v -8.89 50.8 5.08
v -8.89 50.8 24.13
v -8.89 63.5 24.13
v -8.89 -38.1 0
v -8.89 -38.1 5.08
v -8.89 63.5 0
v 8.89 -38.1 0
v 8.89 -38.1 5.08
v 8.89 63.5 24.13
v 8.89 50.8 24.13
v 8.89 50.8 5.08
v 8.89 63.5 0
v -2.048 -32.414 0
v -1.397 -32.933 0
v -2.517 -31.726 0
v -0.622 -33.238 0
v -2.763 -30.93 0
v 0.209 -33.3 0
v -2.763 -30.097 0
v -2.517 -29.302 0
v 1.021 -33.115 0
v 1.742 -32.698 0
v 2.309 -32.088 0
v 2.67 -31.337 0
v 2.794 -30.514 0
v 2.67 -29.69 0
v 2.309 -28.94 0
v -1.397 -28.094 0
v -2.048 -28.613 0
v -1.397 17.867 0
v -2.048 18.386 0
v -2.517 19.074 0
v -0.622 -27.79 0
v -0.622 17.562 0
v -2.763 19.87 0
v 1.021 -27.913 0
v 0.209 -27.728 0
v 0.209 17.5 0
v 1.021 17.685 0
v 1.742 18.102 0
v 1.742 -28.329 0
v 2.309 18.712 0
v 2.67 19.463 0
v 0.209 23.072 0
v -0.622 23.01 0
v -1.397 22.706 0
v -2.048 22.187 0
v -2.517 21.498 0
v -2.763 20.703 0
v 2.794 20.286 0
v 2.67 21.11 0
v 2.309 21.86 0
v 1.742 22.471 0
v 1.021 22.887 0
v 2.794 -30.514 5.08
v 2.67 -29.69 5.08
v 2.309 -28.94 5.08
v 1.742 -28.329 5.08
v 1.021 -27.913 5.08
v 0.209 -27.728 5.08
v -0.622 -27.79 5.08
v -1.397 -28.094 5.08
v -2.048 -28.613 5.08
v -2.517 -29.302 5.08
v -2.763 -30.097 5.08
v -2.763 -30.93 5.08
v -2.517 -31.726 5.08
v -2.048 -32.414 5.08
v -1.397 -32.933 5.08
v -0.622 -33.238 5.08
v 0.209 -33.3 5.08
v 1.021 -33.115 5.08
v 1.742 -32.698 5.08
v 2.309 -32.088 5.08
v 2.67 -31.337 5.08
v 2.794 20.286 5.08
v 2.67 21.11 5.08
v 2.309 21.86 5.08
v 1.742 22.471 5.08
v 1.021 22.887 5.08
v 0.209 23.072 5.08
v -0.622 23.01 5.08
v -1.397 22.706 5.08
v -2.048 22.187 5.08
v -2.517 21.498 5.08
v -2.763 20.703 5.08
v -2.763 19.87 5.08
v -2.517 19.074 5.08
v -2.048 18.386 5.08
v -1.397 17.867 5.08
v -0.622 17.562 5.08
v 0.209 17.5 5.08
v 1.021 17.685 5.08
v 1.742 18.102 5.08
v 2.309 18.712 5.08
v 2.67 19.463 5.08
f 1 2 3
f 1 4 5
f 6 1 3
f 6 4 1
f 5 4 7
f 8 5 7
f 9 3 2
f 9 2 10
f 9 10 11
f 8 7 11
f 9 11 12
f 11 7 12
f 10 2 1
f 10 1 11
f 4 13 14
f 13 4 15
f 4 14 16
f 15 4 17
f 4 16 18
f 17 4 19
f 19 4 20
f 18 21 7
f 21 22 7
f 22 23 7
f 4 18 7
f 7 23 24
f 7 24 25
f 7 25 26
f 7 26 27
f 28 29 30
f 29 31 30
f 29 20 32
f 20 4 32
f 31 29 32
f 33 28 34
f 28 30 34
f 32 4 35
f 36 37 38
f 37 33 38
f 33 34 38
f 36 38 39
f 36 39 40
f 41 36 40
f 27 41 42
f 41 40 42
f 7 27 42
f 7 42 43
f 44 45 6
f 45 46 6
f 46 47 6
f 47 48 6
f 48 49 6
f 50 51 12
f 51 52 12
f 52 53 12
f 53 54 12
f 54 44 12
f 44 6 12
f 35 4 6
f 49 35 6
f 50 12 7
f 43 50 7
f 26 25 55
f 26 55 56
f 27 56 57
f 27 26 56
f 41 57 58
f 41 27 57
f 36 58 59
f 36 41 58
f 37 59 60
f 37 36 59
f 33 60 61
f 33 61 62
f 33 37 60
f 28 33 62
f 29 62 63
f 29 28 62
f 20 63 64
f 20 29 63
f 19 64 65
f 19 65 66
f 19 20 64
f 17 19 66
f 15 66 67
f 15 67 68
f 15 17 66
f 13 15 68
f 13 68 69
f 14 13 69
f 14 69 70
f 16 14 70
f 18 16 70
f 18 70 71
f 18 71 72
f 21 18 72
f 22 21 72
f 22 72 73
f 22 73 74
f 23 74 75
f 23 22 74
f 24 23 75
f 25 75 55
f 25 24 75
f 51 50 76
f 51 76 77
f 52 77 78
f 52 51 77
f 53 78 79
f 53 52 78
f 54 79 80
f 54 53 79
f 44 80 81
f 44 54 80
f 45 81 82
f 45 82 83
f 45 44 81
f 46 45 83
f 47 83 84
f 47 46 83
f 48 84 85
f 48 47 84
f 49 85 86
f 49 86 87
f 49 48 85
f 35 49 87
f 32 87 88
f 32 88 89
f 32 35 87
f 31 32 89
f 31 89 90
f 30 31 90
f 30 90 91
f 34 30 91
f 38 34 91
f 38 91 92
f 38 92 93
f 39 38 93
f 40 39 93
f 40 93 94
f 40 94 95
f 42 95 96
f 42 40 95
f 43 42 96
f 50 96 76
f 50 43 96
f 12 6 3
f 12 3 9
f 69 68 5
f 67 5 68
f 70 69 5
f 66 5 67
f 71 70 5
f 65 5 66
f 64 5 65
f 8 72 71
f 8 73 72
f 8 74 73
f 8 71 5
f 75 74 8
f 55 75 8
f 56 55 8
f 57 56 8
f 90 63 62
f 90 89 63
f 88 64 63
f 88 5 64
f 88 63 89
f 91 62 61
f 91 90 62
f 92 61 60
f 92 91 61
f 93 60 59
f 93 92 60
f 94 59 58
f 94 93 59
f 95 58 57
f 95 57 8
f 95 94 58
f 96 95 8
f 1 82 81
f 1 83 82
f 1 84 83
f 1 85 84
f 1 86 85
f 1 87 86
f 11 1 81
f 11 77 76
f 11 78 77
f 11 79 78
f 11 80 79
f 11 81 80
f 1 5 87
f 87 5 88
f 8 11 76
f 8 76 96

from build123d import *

# Parameters (mm, degrees)
F0_W     = 17.78
F0_H     = 101.6
F0_R     = 2.794
F1_DEPTH = 5.08
F2_W     = 17.78
F2_H     = 12.7
F3_DEPTH = 19.05


with BuildPart() as f1:
    # F0 (on Top) → F1 (new body)
    with BuildSketch(Plane.XY):
        with Locations((0, 12.7)):
            Rectangle(F0_W, F0_H)
        with Locations((0, -30.513791)):
            Circle(F0_R, mode=Mode.SUBTRACT)
        with Locations((0, 20.286209)):
            Circle(F0_R, mode=Mode.SUBTRACT)
    extrude(amount=F1_DEPTH)

    # F2 (on face) → F3 (join)
    with BuildSketch(Plane.XY.offset(5.08)):
        with Locations((0, 57.15)):
            Rectangle(F2_W, F2_H)
    extrude(amount=F3_DEPTH)


solid = f1.part
